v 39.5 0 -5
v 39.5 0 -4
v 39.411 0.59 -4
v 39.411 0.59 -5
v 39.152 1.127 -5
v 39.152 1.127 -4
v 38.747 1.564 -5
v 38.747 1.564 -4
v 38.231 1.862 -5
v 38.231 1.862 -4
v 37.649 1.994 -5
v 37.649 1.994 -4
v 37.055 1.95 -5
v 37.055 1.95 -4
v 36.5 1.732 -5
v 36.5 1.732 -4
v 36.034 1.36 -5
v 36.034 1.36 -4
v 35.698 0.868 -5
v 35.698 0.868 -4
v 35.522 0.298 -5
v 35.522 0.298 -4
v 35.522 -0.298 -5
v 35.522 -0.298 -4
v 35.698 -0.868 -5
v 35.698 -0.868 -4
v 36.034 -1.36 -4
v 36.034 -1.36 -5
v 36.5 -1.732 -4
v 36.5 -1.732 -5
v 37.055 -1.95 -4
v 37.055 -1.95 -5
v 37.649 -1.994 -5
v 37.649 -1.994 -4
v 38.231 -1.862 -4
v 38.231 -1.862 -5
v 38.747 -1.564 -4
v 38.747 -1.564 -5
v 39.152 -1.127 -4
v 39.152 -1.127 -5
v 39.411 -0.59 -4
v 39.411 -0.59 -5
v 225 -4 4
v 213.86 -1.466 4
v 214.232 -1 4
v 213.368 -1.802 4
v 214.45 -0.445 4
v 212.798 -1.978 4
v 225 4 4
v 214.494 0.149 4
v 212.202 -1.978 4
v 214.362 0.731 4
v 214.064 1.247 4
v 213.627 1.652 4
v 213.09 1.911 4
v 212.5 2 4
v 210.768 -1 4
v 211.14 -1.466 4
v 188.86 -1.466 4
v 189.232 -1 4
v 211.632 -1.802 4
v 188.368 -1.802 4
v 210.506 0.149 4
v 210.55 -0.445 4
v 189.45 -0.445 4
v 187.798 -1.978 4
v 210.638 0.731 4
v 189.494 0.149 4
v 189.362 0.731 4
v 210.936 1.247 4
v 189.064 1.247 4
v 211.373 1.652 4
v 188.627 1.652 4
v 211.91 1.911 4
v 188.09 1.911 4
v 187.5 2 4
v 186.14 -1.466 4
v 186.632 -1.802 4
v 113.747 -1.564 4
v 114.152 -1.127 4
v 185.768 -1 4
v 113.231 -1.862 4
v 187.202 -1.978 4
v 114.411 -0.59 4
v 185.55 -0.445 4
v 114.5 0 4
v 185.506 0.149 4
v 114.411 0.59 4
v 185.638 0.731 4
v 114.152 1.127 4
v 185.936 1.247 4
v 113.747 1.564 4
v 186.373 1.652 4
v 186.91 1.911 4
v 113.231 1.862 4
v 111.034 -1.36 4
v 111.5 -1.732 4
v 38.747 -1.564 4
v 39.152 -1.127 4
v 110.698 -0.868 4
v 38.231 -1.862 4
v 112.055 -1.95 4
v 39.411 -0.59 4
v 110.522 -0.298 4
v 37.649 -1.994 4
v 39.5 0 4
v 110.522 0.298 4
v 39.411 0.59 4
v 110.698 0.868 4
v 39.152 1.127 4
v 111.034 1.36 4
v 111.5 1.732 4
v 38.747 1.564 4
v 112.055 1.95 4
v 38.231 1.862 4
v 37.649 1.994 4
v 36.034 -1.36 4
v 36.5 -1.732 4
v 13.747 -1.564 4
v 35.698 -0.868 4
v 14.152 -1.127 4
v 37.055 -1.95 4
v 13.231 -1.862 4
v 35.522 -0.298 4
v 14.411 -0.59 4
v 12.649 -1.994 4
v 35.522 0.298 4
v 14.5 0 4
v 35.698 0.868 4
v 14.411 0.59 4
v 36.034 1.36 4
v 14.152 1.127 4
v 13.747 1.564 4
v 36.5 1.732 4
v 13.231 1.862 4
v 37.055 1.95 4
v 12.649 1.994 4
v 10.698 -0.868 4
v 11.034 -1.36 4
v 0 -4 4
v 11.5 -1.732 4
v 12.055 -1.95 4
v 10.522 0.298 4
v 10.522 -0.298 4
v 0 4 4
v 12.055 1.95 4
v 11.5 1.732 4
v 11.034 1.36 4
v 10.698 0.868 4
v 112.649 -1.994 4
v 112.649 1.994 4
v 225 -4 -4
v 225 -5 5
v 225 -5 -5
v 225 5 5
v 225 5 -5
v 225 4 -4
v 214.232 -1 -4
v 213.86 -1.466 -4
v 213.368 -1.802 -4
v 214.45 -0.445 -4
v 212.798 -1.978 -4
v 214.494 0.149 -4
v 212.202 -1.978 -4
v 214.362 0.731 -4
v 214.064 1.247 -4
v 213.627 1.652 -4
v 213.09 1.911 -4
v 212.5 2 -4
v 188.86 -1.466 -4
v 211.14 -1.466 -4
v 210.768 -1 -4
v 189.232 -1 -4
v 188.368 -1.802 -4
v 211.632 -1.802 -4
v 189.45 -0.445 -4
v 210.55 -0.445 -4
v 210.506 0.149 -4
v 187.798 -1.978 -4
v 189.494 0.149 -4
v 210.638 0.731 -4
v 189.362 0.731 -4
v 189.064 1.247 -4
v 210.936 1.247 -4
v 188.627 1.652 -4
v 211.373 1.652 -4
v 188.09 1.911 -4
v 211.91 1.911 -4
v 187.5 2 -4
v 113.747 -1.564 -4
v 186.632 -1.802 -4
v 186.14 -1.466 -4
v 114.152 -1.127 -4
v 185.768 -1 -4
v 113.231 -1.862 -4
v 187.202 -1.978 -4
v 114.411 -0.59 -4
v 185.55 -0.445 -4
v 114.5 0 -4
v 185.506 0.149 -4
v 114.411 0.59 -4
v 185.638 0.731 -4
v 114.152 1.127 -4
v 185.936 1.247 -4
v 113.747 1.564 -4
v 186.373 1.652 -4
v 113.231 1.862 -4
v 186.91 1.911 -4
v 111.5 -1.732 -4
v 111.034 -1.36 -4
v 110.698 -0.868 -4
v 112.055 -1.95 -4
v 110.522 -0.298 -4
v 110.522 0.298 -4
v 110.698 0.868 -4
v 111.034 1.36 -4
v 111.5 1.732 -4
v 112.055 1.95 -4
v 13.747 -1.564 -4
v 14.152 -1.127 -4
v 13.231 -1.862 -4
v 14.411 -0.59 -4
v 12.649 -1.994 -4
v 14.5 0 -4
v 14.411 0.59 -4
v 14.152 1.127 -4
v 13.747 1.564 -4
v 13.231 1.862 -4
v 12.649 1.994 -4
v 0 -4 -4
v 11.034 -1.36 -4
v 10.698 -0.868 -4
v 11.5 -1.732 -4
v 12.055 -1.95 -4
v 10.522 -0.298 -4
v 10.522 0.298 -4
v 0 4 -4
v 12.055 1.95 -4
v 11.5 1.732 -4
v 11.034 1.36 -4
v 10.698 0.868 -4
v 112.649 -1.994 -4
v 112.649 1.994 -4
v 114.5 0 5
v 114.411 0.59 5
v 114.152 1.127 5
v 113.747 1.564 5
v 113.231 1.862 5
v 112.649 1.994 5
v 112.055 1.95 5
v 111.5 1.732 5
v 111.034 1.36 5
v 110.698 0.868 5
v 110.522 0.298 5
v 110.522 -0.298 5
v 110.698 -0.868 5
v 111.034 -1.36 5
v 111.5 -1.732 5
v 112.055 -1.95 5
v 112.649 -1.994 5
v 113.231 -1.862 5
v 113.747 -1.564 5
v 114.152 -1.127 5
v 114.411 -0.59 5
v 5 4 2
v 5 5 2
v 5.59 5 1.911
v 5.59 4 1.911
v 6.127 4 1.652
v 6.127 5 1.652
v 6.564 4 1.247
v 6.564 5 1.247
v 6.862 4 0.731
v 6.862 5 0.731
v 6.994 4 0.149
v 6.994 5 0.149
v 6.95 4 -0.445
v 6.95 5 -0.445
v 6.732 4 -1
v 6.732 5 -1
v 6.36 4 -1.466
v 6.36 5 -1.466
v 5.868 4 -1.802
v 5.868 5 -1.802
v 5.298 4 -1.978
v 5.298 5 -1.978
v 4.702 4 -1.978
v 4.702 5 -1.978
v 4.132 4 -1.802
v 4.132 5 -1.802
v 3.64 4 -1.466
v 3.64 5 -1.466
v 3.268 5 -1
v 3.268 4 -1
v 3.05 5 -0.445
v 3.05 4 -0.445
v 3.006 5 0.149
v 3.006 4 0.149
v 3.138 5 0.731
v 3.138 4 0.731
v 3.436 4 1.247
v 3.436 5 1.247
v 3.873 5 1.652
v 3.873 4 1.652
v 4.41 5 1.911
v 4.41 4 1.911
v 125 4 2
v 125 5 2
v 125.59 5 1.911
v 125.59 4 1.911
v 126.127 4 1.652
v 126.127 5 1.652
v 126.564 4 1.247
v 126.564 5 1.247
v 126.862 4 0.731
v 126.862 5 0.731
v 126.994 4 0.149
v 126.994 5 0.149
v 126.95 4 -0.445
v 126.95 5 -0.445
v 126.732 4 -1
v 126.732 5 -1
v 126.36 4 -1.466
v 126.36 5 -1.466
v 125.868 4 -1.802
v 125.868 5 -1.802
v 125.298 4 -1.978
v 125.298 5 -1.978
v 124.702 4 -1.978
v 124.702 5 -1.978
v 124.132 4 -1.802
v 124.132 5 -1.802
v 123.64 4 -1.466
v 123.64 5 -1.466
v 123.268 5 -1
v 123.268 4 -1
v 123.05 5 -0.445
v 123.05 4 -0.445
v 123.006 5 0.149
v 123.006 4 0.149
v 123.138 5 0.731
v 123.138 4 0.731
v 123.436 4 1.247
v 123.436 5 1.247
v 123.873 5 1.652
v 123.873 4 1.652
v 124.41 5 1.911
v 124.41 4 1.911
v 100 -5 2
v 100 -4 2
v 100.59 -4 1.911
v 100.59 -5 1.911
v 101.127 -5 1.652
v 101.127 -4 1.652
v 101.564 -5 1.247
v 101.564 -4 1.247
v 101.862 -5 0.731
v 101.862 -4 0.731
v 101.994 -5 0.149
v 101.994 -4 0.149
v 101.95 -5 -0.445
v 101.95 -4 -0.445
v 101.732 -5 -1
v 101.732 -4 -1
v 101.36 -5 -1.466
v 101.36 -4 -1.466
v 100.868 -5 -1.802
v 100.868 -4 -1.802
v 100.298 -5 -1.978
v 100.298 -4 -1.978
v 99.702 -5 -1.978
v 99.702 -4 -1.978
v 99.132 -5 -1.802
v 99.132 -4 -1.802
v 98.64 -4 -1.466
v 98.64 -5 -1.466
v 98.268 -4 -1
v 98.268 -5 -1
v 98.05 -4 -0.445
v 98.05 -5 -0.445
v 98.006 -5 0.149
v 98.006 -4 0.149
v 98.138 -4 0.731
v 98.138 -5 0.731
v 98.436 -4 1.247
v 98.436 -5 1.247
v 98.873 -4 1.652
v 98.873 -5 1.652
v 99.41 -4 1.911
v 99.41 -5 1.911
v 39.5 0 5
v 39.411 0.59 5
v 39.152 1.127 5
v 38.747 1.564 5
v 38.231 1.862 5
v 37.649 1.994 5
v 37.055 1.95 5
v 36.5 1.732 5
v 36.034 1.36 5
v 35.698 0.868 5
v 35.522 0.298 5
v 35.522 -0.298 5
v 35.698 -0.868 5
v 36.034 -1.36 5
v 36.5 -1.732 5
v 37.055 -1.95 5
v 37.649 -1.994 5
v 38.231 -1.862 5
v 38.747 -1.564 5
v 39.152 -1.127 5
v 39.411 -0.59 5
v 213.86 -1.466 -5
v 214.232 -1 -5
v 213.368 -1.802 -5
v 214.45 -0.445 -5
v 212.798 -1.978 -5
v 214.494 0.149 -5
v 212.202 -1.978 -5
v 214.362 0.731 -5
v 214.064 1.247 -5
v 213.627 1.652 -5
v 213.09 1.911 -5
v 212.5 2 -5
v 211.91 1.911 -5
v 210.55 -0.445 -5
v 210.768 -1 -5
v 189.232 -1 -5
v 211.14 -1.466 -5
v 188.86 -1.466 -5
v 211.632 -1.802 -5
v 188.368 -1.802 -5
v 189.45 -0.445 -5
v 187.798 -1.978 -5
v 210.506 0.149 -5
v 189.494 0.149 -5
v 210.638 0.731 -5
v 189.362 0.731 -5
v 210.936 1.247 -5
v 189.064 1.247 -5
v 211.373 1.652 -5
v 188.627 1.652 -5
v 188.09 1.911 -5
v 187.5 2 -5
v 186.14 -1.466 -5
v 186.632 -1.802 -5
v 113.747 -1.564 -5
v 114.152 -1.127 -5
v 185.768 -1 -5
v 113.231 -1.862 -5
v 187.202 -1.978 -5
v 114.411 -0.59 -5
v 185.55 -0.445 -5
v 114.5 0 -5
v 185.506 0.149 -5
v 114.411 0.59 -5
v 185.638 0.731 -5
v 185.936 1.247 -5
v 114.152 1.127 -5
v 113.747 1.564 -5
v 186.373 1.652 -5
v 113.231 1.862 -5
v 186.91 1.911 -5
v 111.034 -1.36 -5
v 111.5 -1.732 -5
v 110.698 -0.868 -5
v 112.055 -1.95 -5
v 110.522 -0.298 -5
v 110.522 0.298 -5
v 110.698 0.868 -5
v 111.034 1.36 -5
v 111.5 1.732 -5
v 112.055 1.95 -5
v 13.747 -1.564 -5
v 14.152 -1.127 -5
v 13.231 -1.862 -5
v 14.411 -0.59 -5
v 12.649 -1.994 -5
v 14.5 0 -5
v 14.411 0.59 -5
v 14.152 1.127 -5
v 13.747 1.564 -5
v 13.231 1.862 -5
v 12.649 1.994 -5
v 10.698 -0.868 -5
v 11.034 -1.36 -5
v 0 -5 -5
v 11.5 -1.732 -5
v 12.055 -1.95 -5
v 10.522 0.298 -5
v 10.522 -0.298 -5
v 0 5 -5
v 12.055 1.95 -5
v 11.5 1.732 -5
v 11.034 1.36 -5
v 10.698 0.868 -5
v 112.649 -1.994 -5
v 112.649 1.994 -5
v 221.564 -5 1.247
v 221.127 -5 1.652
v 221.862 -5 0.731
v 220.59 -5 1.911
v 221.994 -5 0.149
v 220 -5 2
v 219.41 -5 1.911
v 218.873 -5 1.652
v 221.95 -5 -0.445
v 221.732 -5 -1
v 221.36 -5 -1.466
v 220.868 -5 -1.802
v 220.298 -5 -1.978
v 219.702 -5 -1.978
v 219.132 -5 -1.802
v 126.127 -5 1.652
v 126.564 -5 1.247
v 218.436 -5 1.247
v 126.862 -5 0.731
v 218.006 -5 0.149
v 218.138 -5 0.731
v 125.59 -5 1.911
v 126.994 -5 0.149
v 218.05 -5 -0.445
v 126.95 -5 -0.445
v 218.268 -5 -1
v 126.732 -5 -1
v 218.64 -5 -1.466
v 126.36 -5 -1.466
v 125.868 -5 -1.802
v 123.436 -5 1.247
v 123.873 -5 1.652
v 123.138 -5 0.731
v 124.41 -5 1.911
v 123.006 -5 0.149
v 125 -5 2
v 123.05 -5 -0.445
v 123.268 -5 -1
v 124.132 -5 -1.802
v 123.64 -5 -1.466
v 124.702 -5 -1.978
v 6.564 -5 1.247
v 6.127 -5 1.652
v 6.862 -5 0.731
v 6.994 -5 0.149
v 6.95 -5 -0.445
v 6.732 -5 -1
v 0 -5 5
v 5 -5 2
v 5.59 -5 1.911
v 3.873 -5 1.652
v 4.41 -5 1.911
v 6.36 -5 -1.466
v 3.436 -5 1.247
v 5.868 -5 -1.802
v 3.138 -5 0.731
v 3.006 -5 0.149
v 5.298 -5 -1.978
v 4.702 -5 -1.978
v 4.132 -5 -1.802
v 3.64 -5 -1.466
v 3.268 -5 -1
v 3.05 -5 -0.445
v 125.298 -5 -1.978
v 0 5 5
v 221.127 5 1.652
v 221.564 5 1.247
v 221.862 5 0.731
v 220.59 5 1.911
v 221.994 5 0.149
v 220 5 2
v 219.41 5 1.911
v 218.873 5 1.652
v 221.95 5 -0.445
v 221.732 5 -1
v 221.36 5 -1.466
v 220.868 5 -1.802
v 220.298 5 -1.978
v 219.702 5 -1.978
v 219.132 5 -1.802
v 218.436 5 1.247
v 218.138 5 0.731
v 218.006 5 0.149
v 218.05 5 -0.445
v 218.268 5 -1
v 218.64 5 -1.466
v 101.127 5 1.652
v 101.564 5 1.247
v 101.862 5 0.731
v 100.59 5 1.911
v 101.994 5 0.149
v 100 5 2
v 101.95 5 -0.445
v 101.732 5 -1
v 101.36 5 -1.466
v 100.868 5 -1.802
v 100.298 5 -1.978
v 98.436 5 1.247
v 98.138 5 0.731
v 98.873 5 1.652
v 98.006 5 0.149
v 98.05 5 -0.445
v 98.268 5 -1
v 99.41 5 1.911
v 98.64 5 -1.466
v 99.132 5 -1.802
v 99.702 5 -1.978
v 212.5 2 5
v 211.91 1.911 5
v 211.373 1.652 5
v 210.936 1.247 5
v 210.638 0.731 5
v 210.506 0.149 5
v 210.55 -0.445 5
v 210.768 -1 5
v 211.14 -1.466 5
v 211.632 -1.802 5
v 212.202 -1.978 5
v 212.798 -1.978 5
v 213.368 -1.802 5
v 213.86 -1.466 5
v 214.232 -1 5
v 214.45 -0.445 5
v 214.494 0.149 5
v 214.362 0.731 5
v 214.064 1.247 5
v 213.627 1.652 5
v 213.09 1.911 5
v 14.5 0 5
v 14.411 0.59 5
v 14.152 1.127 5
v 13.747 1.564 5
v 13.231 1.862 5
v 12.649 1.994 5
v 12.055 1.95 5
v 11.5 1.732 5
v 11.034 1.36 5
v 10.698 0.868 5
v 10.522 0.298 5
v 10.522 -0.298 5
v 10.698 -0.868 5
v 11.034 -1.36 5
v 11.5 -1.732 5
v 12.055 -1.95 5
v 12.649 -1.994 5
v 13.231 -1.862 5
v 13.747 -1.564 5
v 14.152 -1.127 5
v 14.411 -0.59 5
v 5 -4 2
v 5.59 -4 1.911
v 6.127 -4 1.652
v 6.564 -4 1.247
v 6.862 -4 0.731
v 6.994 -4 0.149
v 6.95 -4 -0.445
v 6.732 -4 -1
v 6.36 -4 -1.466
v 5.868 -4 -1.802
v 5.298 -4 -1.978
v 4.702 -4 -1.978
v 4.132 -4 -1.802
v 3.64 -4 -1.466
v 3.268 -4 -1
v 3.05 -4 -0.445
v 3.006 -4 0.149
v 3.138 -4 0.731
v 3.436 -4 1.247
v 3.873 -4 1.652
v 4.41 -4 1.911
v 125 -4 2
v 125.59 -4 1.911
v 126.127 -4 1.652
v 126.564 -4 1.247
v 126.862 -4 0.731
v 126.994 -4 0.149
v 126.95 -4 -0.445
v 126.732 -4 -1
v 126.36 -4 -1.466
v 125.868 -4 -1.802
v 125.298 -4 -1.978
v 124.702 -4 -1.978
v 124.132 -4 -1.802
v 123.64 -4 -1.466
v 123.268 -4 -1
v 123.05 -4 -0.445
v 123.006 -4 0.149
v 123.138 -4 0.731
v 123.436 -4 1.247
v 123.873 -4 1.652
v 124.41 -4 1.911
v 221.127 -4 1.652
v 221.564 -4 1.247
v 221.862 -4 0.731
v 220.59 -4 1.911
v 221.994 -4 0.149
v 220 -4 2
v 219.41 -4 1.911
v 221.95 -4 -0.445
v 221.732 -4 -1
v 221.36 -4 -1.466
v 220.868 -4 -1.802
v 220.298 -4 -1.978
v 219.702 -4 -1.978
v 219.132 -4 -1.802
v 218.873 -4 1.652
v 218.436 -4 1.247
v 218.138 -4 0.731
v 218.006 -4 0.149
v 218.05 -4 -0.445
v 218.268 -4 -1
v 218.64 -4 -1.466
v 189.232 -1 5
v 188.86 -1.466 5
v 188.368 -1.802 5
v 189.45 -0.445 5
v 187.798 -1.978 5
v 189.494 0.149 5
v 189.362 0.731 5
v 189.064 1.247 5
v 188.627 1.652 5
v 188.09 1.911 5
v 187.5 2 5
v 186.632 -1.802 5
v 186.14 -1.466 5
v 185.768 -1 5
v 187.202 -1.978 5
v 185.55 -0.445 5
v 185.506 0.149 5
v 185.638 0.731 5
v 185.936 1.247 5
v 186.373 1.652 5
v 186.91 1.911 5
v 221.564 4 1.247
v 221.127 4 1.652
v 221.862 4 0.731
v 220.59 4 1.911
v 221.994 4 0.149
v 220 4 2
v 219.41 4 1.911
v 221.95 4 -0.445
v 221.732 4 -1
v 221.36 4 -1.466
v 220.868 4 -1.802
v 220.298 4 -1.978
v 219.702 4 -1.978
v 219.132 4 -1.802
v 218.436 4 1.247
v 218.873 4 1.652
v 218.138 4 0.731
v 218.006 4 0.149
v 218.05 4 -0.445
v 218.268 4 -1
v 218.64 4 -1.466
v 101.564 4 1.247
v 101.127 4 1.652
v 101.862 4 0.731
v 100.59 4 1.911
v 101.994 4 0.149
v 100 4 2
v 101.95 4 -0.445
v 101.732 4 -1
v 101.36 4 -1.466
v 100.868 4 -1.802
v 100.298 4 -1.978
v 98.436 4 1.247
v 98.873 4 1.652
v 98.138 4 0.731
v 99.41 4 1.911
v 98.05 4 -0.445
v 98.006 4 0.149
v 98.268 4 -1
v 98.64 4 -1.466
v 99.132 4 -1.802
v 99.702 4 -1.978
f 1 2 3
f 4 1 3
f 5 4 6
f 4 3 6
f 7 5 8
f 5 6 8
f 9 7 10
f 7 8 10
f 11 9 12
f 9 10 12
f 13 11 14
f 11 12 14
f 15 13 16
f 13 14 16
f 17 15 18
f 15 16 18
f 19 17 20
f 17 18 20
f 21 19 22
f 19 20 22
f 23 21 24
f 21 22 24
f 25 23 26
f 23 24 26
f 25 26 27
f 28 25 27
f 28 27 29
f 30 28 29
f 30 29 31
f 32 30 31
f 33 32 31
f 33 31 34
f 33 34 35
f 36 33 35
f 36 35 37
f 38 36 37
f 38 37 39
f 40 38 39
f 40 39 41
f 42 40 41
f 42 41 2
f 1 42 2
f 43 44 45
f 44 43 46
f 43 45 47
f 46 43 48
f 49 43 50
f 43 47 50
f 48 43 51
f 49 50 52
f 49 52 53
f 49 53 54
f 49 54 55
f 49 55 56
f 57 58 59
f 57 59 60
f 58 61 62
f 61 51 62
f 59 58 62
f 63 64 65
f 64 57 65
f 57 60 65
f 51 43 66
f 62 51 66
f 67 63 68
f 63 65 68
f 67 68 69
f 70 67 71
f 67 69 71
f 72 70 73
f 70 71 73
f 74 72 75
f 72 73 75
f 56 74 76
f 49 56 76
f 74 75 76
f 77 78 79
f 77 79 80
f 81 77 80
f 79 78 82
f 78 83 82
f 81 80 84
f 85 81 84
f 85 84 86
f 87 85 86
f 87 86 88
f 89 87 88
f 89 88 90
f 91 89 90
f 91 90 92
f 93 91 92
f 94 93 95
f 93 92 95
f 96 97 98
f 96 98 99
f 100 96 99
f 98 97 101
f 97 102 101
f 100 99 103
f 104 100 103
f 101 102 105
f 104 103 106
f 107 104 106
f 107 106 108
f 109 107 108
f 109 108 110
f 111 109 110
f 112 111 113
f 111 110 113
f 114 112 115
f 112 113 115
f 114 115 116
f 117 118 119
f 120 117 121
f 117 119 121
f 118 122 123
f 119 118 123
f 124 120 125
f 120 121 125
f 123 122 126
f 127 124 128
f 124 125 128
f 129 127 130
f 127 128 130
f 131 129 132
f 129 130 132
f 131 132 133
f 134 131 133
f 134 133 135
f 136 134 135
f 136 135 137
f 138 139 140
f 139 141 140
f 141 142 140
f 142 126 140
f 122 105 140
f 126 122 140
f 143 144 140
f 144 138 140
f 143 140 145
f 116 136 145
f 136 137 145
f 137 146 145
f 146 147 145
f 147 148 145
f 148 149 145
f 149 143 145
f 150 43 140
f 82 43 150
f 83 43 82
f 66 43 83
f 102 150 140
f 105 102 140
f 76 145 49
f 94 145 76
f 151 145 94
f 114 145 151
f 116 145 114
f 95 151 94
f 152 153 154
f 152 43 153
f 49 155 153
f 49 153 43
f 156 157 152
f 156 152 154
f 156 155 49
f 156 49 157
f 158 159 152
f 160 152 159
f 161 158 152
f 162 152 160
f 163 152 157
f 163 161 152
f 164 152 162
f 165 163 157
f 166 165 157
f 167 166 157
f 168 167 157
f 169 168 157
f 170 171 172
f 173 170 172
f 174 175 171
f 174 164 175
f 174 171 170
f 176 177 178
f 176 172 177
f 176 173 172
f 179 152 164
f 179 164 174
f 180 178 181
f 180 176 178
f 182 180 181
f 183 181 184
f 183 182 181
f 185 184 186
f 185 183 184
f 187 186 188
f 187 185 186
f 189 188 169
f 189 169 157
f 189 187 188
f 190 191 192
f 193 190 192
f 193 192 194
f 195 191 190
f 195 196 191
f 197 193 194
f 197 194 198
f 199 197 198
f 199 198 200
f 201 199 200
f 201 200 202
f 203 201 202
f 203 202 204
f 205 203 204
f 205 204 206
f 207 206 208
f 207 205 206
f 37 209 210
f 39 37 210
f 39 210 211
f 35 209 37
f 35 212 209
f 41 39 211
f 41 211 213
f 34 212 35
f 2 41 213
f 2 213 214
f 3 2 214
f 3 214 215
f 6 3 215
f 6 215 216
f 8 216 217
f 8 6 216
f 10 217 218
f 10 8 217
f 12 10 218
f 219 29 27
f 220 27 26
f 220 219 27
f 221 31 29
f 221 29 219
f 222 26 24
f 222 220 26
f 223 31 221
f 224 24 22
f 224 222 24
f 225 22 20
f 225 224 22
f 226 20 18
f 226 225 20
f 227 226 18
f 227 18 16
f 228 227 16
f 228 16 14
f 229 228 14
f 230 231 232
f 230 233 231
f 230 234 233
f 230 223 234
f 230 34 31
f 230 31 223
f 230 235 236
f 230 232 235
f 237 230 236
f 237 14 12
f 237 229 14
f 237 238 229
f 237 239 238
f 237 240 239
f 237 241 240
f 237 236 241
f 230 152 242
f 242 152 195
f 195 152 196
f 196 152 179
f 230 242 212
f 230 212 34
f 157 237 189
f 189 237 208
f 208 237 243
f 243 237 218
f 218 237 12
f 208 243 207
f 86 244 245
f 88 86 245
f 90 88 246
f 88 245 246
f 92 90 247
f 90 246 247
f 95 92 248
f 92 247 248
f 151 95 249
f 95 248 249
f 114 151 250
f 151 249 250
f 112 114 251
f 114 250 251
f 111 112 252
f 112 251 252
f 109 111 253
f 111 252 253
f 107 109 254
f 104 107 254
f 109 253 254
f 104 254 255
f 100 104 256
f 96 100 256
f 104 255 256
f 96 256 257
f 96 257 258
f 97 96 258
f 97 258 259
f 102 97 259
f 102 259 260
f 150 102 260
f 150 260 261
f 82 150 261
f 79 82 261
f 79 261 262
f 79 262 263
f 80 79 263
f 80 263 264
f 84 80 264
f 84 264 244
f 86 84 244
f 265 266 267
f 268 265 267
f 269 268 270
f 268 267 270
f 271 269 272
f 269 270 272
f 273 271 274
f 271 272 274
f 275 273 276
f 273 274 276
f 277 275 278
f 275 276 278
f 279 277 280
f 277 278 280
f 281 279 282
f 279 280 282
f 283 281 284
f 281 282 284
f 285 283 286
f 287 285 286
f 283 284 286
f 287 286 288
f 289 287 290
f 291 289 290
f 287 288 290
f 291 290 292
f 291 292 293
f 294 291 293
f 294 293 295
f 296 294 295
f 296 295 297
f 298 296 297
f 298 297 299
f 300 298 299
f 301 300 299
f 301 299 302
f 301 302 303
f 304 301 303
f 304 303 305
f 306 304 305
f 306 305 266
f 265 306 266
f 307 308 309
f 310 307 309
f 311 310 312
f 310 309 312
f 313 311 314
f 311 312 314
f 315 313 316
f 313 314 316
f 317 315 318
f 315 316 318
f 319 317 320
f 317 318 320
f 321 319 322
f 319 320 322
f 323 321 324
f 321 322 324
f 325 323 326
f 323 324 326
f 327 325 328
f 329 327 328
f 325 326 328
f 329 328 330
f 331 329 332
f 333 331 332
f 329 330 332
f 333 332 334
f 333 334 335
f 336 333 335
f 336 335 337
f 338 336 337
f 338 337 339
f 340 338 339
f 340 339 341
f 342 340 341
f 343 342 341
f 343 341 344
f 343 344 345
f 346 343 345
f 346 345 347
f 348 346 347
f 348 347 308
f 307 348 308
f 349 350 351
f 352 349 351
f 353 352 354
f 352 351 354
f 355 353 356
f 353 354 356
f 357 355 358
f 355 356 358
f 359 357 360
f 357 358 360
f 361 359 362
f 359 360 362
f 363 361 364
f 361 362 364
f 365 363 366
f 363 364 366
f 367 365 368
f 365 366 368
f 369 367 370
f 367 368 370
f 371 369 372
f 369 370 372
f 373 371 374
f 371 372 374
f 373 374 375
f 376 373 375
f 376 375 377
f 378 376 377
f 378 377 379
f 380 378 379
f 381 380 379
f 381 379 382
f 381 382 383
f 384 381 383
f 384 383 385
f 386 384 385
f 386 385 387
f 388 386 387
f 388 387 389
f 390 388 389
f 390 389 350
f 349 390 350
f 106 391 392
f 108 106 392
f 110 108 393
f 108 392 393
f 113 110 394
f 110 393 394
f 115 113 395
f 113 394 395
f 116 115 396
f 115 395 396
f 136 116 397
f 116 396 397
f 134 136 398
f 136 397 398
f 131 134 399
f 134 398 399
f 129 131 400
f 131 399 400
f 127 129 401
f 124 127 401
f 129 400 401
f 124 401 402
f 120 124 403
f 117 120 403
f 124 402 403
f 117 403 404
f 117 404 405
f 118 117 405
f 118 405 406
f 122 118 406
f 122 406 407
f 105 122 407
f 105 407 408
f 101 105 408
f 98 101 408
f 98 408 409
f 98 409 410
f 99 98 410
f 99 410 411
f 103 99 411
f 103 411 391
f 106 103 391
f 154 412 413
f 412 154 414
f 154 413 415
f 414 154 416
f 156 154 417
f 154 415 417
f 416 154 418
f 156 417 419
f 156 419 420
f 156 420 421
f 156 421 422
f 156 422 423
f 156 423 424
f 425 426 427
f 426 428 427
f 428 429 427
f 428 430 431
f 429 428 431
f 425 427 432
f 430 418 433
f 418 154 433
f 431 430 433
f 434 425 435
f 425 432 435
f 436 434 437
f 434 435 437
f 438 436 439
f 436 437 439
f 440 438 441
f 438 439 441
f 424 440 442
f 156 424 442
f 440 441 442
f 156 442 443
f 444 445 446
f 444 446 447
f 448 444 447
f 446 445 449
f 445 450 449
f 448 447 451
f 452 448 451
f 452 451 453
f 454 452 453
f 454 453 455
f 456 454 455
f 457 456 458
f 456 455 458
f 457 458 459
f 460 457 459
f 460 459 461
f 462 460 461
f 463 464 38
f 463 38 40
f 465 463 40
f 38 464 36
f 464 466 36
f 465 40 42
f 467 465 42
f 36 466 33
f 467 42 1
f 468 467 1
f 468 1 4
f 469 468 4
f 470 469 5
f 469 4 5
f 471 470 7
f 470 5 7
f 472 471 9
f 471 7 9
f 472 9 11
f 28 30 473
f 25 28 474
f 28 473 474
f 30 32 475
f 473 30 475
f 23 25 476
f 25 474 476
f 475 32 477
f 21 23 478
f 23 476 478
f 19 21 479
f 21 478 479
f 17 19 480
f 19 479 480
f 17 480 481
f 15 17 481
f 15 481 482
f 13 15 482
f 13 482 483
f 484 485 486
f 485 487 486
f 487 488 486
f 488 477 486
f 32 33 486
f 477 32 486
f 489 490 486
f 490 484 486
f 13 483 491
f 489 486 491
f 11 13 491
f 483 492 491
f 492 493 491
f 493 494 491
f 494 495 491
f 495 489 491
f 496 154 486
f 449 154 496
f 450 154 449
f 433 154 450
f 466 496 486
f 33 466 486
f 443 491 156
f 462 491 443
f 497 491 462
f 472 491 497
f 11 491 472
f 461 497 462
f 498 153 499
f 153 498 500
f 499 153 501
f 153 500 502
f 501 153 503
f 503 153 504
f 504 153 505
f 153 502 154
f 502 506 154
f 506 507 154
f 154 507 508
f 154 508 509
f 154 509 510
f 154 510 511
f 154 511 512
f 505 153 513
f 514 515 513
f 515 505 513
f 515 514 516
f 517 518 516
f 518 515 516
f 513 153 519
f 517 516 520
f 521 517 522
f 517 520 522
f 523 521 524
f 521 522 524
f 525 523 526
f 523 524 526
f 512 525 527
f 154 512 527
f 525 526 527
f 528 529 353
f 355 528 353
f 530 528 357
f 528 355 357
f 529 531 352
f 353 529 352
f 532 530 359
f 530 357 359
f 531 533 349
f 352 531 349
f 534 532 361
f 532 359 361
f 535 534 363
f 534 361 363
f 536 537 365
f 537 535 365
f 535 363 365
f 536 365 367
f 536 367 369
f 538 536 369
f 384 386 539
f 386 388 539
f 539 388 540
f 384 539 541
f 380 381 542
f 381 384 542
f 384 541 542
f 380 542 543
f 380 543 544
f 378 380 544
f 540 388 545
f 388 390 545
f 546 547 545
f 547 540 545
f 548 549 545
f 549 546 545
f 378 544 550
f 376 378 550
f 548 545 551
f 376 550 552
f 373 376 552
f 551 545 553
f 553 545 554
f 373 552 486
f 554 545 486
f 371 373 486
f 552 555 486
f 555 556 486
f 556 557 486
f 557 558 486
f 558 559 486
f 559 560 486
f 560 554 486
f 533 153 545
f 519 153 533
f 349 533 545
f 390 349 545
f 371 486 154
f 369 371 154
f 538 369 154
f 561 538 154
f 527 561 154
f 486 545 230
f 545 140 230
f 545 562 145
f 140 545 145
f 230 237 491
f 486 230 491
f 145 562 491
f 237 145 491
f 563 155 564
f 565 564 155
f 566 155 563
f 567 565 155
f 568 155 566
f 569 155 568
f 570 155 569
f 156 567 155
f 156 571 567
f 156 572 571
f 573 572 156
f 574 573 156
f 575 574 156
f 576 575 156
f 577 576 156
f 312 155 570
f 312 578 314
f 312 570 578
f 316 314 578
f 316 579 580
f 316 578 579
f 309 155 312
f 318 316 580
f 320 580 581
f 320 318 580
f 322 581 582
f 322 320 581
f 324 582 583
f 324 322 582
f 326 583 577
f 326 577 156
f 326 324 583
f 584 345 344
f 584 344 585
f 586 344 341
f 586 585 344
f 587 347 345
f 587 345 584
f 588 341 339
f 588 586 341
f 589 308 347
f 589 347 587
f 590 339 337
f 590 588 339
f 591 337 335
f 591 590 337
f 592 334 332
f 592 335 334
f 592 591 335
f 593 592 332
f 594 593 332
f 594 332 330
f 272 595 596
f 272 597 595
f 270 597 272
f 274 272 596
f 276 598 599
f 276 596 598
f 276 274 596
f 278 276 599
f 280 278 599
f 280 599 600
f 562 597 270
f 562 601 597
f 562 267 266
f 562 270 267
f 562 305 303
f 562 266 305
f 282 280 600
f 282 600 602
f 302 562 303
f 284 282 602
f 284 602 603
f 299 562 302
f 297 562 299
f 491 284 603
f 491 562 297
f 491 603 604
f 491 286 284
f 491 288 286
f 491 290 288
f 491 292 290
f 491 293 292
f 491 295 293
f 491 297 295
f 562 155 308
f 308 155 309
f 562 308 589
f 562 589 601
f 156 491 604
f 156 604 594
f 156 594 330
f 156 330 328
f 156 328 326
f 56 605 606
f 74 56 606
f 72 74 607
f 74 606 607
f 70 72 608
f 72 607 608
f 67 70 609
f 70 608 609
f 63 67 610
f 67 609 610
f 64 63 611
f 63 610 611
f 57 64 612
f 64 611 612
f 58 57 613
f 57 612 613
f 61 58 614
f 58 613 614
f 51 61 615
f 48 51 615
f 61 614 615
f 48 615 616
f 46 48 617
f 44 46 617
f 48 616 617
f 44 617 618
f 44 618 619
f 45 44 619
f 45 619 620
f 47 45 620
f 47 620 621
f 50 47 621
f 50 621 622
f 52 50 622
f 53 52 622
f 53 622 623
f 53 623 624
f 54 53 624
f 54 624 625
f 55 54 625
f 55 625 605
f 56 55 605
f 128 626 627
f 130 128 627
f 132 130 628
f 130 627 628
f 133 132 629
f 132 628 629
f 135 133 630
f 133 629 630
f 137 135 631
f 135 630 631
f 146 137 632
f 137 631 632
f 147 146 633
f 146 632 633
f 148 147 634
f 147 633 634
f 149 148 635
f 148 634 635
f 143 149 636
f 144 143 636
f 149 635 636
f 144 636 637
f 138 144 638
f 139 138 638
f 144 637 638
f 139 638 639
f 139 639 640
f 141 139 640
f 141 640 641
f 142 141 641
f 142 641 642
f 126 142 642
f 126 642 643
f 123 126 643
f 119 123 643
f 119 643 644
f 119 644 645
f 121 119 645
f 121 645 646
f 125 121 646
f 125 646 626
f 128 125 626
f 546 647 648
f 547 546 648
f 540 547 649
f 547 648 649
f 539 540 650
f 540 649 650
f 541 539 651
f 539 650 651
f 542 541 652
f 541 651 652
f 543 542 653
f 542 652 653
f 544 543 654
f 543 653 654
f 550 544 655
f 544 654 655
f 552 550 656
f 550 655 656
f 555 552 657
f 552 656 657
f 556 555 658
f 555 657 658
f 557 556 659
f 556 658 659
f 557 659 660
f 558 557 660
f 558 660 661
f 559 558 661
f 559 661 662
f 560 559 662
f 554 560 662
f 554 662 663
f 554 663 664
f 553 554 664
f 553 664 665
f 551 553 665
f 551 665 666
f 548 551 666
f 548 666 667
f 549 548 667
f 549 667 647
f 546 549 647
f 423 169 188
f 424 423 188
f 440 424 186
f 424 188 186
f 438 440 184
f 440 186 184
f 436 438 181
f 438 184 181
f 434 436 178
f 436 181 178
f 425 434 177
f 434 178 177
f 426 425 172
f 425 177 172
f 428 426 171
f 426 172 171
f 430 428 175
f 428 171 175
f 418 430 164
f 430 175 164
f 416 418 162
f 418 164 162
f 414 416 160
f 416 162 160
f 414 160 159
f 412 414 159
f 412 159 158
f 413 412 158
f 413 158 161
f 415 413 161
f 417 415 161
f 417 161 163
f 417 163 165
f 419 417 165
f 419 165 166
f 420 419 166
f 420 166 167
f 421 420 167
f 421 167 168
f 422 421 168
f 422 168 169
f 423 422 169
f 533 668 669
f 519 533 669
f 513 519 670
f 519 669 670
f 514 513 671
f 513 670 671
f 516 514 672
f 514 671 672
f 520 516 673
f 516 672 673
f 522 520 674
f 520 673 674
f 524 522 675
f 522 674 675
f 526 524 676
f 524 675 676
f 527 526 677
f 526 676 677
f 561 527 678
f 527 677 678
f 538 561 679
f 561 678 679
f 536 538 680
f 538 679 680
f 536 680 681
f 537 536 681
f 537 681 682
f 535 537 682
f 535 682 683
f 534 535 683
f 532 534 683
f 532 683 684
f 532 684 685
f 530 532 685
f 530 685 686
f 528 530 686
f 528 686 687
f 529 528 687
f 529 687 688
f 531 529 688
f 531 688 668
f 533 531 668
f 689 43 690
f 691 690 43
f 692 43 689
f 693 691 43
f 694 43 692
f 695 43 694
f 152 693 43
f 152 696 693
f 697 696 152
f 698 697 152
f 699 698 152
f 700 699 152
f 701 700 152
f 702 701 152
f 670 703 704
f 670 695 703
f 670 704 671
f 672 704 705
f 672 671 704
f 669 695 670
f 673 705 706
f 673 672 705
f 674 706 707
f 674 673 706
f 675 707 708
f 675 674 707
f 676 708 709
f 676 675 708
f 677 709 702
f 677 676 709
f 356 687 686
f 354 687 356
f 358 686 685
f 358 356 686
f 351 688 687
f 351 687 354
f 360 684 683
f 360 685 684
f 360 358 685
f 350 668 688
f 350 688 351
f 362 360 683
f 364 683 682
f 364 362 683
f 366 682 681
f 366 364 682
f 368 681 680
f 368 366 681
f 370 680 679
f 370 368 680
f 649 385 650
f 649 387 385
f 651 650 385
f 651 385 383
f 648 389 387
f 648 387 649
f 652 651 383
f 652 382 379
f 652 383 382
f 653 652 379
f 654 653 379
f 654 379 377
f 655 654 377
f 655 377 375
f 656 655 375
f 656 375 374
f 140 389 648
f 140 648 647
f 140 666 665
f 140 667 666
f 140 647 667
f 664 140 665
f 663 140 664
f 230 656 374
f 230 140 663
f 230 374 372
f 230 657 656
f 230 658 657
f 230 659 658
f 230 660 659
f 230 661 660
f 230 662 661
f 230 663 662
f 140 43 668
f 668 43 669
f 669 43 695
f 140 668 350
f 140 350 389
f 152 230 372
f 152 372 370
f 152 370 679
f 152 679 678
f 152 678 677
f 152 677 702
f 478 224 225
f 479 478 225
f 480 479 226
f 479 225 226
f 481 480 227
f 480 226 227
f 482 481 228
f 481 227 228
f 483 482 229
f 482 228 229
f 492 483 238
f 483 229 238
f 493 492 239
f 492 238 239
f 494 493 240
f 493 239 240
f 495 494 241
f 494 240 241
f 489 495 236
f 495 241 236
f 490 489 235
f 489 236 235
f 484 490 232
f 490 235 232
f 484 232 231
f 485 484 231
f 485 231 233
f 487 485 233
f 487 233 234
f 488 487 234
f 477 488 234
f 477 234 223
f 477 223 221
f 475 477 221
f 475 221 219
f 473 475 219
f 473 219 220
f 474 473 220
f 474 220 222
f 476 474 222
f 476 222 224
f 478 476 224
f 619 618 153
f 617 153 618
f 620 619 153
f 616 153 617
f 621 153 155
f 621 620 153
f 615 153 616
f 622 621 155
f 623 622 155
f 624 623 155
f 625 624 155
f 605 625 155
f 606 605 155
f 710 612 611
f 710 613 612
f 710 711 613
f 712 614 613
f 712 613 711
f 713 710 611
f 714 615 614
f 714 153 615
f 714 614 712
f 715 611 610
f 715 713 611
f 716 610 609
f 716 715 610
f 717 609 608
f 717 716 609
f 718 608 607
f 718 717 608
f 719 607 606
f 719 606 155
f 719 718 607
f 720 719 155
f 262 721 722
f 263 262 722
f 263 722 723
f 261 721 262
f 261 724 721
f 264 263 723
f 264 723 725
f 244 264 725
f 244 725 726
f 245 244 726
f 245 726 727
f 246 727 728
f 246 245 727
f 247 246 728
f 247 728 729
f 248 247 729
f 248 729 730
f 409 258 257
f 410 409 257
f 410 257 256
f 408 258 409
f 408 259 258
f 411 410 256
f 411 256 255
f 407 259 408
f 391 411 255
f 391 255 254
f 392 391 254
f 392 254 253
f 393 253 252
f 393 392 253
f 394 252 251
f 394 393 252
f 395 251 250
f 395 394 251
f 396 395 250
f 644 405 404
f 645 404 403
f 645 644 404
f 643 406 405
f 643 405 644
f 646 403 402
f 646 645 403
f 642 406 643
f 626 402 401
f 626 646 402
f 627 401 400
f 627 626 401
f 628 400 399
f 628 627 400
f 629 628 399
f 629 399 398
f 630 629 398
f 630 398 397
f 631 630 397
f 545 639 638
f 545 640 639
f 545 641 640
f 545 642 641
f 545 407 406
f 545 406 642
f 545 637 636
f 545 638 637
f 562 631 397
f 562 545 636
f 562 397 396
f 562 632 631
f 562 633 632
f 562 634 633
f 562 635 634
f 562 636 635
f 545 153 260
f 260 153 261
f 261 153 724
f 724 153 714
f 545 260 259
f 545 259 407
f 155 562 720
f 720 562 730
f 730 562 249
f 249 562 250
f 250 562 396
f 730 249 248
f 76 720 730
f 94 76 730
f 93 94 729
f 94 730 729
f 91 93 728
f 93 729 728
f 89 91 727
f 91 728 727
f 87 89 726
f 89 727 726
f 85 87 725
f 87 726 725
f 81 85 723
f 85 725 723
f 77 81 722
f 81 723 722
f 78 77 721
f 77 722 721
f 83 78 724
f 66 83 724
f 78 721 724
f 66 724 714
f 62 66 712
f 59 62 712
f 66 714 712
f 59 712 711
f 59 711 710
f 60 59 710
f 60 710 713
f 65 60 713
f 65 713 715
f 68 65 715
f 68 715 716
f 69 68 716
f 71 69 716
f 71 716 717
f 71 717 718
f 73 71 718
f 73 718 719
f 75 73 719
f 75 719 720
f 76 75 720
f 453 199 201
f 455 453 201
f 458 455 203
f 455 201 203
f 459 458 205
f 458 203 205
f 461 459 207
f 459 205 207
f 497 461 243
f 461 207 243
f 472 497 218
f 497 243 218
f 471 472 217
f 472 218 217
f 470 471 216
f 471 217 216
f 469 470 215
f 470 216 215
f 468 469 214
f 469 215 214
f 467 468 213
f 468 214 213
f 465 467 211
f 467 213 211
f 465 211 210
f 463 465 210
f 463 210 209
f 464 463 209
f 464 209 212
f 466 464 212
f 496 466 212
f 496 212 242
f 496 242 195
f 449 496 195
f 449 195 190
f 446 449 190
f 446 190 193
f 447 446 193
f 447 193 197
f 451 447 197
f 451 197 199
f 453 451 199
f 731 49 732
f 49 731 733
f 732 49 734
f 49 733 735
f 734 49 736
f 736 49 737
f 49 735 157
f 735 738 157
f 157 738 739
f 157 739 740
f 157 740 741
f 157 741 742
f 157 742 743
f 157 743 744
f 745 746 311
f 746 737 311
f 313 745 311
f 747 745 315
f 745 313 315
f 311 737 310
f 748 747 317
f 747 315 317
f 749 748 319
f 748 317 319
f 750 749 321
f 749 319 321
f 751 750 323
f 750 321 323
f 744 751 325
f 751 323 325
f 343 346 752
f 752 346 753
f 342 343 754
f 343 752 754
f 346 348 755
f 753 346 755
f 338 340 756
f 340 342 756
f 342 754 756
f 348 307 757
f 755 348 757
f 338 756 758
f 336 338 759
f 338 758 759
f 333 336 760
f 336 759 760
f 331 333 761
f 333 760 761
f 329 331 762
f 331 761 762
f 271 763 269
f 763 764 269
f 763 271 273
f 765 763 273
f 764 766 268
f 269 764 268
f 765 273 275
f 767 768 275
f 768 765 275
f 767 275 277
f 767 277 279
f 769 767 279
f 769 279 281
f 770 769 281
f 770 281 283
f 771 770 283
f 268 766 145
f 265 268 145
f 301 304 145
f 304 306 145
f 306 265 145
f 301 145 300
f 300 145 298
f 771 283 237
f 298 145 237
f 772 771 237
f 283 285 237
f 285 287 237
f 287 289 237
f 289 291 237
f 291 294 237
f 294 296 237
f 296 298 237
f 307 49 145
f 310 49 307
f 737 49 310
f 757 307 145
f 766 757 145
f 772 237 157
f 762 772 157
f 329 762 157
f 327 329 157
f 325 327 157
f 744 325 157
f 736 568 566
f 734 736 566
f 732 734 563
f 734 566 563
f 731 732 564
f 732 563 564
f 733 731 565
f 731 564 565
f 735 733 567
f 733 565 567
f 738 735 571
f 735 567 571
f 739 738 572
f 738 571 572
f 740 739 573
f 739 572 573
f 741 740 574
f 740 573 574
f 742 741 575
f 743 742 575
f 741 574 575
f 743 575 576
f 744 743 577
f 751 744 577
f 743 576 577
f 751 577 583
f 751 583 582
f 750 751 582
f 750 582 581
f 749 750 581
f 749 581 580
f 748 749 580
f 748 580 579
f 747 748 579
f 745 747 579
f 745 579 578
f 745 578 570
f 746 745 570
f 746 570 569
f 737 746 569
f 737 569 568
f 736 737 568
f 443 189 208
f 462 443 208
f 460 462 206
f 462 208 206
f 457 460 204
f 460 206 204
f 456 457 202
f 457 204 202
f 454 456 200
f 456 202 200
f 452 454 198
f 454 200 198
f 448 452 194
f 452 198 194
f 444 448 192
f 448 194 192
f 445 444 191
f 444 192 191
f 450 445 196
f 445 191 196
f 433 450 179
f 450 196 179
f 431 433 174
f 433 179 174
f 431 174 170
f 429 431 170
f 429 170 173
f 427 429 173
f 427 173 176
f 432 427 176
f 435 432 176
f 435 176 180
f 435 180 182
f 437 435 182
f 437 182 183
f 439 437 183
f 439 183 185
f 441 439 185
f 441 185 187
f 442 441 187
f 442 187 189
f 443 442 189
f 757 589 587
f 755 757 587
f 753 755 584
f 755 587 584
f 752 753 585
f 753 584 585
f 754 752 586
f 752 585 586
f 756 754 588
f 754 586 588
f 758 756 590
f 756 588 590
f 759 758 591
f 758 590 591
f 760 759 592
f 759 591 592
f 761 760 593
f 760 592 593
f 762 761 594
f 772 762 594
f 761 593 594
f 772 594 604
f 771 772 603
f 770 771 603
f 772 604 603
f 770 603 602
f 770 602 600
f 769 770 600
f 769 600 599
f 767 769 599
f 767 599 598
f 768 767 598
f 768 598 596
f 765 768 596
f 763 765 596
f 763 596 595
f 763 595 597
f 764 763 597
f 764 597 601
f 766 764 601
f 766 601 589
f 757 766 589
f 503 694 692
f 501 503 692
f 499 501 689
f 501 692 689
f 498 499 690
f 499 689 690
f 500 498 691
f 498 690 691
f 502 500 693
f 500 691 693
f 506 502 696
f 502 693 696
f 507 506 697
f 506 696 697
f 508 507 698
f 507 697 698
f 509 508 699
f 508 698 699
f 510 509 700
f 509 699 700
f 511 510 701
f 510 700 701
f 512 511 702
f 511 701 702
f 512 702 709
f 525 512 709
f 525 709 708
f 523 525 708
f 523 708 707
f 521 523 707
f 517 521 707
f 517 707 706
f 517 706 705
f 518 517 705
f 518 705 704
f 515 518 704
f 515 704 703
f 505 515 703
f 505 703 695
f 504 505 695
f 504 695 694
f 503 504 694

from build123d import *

# Parameters (mm, degrees)
SKETCH_1_W          = 10
SKETCH_1_H          = 10
SKETCH_1_W_2        = 8
SKETCH_1_H_2        = 8
EXTRUDE_1_DEPTH     = 225
SKETCH_2_R          = 2
CUT_EXTRUDE_1_DEPTH = 226.277606521
SKETCH_3_R          = 2
CUT_EXTRUDE_2_DEPTH = 226.277606521


with BuildPart() as part:
    # ｽｹｯﾁ1 → 押し出し-薄板1 (new body)
    with BuildSketch(Plane(origin=(0, 0, 0), x_dir=(0, 0, -1), z_dir=(1, 0, 0))):
        Rectangle(SKETCH_1_W, SKETCH_1_H)
        Rectangle(SKETCH_1_W_2, SKETCH_1_H_2, mode=Mode.SUBTRACT)
    extrude(amount=EXTRUDE_1_DEPTH)

    # ｽｹｯﾁ2 → ｶｯﾄ - 押し出し1 (cut, through all)
    with BuildSketch(Plane.XY.offset(5)):
        with Locations((37.5, 0)):
            Circle(SKETCH_2_R)
        with Locations(Location((187.5, 0, 0), (0, 0, 90))):
            Circle(SKETCH_2_R)
        with Locations((112.5, 0)):
            Circle(SKETCH_2_R)
        with Locations((12.5, 0)):
            Circle(SKETCH_2_R)
        with Locations(Location((212.5, 0, 0), (0, 0, 90))):
            Circle(SKETCH_2_R)
    extrude(amount=-CUT_EXTRUDE_1_DEPTH, mode=Mode.SUBTRACT)

    # ｽｹｯﾁ3 → ｶｯﾄ - 押し出し2 (cut, through all)
    with BuildSketch(Plane(origin=(0, 5, 0), x_dir=(1, 0, 0), z_dir=(0, 1, 0))):
        with Locations(Location((5, 0, 0), (0, 0, 270))):
            Circle(SKETCH_3_R)
        with Locations(Location((220, 0, 0), (0, 0, 270))):
            Circle(SKETCH_3_R)
        with Locations(Location((100, 0, 0), (0, 0, 270))):
            Circle(SKETCH_3_R)
        with Locations(Location((125, 0, 0), (0, 0, 270))):
            Circle(SKETCH_3_R)
    extrude(amount=-CUT_EXTRUDE_2_DEPTH, mode=Mode.SUBTRACT)


solid = part.part
